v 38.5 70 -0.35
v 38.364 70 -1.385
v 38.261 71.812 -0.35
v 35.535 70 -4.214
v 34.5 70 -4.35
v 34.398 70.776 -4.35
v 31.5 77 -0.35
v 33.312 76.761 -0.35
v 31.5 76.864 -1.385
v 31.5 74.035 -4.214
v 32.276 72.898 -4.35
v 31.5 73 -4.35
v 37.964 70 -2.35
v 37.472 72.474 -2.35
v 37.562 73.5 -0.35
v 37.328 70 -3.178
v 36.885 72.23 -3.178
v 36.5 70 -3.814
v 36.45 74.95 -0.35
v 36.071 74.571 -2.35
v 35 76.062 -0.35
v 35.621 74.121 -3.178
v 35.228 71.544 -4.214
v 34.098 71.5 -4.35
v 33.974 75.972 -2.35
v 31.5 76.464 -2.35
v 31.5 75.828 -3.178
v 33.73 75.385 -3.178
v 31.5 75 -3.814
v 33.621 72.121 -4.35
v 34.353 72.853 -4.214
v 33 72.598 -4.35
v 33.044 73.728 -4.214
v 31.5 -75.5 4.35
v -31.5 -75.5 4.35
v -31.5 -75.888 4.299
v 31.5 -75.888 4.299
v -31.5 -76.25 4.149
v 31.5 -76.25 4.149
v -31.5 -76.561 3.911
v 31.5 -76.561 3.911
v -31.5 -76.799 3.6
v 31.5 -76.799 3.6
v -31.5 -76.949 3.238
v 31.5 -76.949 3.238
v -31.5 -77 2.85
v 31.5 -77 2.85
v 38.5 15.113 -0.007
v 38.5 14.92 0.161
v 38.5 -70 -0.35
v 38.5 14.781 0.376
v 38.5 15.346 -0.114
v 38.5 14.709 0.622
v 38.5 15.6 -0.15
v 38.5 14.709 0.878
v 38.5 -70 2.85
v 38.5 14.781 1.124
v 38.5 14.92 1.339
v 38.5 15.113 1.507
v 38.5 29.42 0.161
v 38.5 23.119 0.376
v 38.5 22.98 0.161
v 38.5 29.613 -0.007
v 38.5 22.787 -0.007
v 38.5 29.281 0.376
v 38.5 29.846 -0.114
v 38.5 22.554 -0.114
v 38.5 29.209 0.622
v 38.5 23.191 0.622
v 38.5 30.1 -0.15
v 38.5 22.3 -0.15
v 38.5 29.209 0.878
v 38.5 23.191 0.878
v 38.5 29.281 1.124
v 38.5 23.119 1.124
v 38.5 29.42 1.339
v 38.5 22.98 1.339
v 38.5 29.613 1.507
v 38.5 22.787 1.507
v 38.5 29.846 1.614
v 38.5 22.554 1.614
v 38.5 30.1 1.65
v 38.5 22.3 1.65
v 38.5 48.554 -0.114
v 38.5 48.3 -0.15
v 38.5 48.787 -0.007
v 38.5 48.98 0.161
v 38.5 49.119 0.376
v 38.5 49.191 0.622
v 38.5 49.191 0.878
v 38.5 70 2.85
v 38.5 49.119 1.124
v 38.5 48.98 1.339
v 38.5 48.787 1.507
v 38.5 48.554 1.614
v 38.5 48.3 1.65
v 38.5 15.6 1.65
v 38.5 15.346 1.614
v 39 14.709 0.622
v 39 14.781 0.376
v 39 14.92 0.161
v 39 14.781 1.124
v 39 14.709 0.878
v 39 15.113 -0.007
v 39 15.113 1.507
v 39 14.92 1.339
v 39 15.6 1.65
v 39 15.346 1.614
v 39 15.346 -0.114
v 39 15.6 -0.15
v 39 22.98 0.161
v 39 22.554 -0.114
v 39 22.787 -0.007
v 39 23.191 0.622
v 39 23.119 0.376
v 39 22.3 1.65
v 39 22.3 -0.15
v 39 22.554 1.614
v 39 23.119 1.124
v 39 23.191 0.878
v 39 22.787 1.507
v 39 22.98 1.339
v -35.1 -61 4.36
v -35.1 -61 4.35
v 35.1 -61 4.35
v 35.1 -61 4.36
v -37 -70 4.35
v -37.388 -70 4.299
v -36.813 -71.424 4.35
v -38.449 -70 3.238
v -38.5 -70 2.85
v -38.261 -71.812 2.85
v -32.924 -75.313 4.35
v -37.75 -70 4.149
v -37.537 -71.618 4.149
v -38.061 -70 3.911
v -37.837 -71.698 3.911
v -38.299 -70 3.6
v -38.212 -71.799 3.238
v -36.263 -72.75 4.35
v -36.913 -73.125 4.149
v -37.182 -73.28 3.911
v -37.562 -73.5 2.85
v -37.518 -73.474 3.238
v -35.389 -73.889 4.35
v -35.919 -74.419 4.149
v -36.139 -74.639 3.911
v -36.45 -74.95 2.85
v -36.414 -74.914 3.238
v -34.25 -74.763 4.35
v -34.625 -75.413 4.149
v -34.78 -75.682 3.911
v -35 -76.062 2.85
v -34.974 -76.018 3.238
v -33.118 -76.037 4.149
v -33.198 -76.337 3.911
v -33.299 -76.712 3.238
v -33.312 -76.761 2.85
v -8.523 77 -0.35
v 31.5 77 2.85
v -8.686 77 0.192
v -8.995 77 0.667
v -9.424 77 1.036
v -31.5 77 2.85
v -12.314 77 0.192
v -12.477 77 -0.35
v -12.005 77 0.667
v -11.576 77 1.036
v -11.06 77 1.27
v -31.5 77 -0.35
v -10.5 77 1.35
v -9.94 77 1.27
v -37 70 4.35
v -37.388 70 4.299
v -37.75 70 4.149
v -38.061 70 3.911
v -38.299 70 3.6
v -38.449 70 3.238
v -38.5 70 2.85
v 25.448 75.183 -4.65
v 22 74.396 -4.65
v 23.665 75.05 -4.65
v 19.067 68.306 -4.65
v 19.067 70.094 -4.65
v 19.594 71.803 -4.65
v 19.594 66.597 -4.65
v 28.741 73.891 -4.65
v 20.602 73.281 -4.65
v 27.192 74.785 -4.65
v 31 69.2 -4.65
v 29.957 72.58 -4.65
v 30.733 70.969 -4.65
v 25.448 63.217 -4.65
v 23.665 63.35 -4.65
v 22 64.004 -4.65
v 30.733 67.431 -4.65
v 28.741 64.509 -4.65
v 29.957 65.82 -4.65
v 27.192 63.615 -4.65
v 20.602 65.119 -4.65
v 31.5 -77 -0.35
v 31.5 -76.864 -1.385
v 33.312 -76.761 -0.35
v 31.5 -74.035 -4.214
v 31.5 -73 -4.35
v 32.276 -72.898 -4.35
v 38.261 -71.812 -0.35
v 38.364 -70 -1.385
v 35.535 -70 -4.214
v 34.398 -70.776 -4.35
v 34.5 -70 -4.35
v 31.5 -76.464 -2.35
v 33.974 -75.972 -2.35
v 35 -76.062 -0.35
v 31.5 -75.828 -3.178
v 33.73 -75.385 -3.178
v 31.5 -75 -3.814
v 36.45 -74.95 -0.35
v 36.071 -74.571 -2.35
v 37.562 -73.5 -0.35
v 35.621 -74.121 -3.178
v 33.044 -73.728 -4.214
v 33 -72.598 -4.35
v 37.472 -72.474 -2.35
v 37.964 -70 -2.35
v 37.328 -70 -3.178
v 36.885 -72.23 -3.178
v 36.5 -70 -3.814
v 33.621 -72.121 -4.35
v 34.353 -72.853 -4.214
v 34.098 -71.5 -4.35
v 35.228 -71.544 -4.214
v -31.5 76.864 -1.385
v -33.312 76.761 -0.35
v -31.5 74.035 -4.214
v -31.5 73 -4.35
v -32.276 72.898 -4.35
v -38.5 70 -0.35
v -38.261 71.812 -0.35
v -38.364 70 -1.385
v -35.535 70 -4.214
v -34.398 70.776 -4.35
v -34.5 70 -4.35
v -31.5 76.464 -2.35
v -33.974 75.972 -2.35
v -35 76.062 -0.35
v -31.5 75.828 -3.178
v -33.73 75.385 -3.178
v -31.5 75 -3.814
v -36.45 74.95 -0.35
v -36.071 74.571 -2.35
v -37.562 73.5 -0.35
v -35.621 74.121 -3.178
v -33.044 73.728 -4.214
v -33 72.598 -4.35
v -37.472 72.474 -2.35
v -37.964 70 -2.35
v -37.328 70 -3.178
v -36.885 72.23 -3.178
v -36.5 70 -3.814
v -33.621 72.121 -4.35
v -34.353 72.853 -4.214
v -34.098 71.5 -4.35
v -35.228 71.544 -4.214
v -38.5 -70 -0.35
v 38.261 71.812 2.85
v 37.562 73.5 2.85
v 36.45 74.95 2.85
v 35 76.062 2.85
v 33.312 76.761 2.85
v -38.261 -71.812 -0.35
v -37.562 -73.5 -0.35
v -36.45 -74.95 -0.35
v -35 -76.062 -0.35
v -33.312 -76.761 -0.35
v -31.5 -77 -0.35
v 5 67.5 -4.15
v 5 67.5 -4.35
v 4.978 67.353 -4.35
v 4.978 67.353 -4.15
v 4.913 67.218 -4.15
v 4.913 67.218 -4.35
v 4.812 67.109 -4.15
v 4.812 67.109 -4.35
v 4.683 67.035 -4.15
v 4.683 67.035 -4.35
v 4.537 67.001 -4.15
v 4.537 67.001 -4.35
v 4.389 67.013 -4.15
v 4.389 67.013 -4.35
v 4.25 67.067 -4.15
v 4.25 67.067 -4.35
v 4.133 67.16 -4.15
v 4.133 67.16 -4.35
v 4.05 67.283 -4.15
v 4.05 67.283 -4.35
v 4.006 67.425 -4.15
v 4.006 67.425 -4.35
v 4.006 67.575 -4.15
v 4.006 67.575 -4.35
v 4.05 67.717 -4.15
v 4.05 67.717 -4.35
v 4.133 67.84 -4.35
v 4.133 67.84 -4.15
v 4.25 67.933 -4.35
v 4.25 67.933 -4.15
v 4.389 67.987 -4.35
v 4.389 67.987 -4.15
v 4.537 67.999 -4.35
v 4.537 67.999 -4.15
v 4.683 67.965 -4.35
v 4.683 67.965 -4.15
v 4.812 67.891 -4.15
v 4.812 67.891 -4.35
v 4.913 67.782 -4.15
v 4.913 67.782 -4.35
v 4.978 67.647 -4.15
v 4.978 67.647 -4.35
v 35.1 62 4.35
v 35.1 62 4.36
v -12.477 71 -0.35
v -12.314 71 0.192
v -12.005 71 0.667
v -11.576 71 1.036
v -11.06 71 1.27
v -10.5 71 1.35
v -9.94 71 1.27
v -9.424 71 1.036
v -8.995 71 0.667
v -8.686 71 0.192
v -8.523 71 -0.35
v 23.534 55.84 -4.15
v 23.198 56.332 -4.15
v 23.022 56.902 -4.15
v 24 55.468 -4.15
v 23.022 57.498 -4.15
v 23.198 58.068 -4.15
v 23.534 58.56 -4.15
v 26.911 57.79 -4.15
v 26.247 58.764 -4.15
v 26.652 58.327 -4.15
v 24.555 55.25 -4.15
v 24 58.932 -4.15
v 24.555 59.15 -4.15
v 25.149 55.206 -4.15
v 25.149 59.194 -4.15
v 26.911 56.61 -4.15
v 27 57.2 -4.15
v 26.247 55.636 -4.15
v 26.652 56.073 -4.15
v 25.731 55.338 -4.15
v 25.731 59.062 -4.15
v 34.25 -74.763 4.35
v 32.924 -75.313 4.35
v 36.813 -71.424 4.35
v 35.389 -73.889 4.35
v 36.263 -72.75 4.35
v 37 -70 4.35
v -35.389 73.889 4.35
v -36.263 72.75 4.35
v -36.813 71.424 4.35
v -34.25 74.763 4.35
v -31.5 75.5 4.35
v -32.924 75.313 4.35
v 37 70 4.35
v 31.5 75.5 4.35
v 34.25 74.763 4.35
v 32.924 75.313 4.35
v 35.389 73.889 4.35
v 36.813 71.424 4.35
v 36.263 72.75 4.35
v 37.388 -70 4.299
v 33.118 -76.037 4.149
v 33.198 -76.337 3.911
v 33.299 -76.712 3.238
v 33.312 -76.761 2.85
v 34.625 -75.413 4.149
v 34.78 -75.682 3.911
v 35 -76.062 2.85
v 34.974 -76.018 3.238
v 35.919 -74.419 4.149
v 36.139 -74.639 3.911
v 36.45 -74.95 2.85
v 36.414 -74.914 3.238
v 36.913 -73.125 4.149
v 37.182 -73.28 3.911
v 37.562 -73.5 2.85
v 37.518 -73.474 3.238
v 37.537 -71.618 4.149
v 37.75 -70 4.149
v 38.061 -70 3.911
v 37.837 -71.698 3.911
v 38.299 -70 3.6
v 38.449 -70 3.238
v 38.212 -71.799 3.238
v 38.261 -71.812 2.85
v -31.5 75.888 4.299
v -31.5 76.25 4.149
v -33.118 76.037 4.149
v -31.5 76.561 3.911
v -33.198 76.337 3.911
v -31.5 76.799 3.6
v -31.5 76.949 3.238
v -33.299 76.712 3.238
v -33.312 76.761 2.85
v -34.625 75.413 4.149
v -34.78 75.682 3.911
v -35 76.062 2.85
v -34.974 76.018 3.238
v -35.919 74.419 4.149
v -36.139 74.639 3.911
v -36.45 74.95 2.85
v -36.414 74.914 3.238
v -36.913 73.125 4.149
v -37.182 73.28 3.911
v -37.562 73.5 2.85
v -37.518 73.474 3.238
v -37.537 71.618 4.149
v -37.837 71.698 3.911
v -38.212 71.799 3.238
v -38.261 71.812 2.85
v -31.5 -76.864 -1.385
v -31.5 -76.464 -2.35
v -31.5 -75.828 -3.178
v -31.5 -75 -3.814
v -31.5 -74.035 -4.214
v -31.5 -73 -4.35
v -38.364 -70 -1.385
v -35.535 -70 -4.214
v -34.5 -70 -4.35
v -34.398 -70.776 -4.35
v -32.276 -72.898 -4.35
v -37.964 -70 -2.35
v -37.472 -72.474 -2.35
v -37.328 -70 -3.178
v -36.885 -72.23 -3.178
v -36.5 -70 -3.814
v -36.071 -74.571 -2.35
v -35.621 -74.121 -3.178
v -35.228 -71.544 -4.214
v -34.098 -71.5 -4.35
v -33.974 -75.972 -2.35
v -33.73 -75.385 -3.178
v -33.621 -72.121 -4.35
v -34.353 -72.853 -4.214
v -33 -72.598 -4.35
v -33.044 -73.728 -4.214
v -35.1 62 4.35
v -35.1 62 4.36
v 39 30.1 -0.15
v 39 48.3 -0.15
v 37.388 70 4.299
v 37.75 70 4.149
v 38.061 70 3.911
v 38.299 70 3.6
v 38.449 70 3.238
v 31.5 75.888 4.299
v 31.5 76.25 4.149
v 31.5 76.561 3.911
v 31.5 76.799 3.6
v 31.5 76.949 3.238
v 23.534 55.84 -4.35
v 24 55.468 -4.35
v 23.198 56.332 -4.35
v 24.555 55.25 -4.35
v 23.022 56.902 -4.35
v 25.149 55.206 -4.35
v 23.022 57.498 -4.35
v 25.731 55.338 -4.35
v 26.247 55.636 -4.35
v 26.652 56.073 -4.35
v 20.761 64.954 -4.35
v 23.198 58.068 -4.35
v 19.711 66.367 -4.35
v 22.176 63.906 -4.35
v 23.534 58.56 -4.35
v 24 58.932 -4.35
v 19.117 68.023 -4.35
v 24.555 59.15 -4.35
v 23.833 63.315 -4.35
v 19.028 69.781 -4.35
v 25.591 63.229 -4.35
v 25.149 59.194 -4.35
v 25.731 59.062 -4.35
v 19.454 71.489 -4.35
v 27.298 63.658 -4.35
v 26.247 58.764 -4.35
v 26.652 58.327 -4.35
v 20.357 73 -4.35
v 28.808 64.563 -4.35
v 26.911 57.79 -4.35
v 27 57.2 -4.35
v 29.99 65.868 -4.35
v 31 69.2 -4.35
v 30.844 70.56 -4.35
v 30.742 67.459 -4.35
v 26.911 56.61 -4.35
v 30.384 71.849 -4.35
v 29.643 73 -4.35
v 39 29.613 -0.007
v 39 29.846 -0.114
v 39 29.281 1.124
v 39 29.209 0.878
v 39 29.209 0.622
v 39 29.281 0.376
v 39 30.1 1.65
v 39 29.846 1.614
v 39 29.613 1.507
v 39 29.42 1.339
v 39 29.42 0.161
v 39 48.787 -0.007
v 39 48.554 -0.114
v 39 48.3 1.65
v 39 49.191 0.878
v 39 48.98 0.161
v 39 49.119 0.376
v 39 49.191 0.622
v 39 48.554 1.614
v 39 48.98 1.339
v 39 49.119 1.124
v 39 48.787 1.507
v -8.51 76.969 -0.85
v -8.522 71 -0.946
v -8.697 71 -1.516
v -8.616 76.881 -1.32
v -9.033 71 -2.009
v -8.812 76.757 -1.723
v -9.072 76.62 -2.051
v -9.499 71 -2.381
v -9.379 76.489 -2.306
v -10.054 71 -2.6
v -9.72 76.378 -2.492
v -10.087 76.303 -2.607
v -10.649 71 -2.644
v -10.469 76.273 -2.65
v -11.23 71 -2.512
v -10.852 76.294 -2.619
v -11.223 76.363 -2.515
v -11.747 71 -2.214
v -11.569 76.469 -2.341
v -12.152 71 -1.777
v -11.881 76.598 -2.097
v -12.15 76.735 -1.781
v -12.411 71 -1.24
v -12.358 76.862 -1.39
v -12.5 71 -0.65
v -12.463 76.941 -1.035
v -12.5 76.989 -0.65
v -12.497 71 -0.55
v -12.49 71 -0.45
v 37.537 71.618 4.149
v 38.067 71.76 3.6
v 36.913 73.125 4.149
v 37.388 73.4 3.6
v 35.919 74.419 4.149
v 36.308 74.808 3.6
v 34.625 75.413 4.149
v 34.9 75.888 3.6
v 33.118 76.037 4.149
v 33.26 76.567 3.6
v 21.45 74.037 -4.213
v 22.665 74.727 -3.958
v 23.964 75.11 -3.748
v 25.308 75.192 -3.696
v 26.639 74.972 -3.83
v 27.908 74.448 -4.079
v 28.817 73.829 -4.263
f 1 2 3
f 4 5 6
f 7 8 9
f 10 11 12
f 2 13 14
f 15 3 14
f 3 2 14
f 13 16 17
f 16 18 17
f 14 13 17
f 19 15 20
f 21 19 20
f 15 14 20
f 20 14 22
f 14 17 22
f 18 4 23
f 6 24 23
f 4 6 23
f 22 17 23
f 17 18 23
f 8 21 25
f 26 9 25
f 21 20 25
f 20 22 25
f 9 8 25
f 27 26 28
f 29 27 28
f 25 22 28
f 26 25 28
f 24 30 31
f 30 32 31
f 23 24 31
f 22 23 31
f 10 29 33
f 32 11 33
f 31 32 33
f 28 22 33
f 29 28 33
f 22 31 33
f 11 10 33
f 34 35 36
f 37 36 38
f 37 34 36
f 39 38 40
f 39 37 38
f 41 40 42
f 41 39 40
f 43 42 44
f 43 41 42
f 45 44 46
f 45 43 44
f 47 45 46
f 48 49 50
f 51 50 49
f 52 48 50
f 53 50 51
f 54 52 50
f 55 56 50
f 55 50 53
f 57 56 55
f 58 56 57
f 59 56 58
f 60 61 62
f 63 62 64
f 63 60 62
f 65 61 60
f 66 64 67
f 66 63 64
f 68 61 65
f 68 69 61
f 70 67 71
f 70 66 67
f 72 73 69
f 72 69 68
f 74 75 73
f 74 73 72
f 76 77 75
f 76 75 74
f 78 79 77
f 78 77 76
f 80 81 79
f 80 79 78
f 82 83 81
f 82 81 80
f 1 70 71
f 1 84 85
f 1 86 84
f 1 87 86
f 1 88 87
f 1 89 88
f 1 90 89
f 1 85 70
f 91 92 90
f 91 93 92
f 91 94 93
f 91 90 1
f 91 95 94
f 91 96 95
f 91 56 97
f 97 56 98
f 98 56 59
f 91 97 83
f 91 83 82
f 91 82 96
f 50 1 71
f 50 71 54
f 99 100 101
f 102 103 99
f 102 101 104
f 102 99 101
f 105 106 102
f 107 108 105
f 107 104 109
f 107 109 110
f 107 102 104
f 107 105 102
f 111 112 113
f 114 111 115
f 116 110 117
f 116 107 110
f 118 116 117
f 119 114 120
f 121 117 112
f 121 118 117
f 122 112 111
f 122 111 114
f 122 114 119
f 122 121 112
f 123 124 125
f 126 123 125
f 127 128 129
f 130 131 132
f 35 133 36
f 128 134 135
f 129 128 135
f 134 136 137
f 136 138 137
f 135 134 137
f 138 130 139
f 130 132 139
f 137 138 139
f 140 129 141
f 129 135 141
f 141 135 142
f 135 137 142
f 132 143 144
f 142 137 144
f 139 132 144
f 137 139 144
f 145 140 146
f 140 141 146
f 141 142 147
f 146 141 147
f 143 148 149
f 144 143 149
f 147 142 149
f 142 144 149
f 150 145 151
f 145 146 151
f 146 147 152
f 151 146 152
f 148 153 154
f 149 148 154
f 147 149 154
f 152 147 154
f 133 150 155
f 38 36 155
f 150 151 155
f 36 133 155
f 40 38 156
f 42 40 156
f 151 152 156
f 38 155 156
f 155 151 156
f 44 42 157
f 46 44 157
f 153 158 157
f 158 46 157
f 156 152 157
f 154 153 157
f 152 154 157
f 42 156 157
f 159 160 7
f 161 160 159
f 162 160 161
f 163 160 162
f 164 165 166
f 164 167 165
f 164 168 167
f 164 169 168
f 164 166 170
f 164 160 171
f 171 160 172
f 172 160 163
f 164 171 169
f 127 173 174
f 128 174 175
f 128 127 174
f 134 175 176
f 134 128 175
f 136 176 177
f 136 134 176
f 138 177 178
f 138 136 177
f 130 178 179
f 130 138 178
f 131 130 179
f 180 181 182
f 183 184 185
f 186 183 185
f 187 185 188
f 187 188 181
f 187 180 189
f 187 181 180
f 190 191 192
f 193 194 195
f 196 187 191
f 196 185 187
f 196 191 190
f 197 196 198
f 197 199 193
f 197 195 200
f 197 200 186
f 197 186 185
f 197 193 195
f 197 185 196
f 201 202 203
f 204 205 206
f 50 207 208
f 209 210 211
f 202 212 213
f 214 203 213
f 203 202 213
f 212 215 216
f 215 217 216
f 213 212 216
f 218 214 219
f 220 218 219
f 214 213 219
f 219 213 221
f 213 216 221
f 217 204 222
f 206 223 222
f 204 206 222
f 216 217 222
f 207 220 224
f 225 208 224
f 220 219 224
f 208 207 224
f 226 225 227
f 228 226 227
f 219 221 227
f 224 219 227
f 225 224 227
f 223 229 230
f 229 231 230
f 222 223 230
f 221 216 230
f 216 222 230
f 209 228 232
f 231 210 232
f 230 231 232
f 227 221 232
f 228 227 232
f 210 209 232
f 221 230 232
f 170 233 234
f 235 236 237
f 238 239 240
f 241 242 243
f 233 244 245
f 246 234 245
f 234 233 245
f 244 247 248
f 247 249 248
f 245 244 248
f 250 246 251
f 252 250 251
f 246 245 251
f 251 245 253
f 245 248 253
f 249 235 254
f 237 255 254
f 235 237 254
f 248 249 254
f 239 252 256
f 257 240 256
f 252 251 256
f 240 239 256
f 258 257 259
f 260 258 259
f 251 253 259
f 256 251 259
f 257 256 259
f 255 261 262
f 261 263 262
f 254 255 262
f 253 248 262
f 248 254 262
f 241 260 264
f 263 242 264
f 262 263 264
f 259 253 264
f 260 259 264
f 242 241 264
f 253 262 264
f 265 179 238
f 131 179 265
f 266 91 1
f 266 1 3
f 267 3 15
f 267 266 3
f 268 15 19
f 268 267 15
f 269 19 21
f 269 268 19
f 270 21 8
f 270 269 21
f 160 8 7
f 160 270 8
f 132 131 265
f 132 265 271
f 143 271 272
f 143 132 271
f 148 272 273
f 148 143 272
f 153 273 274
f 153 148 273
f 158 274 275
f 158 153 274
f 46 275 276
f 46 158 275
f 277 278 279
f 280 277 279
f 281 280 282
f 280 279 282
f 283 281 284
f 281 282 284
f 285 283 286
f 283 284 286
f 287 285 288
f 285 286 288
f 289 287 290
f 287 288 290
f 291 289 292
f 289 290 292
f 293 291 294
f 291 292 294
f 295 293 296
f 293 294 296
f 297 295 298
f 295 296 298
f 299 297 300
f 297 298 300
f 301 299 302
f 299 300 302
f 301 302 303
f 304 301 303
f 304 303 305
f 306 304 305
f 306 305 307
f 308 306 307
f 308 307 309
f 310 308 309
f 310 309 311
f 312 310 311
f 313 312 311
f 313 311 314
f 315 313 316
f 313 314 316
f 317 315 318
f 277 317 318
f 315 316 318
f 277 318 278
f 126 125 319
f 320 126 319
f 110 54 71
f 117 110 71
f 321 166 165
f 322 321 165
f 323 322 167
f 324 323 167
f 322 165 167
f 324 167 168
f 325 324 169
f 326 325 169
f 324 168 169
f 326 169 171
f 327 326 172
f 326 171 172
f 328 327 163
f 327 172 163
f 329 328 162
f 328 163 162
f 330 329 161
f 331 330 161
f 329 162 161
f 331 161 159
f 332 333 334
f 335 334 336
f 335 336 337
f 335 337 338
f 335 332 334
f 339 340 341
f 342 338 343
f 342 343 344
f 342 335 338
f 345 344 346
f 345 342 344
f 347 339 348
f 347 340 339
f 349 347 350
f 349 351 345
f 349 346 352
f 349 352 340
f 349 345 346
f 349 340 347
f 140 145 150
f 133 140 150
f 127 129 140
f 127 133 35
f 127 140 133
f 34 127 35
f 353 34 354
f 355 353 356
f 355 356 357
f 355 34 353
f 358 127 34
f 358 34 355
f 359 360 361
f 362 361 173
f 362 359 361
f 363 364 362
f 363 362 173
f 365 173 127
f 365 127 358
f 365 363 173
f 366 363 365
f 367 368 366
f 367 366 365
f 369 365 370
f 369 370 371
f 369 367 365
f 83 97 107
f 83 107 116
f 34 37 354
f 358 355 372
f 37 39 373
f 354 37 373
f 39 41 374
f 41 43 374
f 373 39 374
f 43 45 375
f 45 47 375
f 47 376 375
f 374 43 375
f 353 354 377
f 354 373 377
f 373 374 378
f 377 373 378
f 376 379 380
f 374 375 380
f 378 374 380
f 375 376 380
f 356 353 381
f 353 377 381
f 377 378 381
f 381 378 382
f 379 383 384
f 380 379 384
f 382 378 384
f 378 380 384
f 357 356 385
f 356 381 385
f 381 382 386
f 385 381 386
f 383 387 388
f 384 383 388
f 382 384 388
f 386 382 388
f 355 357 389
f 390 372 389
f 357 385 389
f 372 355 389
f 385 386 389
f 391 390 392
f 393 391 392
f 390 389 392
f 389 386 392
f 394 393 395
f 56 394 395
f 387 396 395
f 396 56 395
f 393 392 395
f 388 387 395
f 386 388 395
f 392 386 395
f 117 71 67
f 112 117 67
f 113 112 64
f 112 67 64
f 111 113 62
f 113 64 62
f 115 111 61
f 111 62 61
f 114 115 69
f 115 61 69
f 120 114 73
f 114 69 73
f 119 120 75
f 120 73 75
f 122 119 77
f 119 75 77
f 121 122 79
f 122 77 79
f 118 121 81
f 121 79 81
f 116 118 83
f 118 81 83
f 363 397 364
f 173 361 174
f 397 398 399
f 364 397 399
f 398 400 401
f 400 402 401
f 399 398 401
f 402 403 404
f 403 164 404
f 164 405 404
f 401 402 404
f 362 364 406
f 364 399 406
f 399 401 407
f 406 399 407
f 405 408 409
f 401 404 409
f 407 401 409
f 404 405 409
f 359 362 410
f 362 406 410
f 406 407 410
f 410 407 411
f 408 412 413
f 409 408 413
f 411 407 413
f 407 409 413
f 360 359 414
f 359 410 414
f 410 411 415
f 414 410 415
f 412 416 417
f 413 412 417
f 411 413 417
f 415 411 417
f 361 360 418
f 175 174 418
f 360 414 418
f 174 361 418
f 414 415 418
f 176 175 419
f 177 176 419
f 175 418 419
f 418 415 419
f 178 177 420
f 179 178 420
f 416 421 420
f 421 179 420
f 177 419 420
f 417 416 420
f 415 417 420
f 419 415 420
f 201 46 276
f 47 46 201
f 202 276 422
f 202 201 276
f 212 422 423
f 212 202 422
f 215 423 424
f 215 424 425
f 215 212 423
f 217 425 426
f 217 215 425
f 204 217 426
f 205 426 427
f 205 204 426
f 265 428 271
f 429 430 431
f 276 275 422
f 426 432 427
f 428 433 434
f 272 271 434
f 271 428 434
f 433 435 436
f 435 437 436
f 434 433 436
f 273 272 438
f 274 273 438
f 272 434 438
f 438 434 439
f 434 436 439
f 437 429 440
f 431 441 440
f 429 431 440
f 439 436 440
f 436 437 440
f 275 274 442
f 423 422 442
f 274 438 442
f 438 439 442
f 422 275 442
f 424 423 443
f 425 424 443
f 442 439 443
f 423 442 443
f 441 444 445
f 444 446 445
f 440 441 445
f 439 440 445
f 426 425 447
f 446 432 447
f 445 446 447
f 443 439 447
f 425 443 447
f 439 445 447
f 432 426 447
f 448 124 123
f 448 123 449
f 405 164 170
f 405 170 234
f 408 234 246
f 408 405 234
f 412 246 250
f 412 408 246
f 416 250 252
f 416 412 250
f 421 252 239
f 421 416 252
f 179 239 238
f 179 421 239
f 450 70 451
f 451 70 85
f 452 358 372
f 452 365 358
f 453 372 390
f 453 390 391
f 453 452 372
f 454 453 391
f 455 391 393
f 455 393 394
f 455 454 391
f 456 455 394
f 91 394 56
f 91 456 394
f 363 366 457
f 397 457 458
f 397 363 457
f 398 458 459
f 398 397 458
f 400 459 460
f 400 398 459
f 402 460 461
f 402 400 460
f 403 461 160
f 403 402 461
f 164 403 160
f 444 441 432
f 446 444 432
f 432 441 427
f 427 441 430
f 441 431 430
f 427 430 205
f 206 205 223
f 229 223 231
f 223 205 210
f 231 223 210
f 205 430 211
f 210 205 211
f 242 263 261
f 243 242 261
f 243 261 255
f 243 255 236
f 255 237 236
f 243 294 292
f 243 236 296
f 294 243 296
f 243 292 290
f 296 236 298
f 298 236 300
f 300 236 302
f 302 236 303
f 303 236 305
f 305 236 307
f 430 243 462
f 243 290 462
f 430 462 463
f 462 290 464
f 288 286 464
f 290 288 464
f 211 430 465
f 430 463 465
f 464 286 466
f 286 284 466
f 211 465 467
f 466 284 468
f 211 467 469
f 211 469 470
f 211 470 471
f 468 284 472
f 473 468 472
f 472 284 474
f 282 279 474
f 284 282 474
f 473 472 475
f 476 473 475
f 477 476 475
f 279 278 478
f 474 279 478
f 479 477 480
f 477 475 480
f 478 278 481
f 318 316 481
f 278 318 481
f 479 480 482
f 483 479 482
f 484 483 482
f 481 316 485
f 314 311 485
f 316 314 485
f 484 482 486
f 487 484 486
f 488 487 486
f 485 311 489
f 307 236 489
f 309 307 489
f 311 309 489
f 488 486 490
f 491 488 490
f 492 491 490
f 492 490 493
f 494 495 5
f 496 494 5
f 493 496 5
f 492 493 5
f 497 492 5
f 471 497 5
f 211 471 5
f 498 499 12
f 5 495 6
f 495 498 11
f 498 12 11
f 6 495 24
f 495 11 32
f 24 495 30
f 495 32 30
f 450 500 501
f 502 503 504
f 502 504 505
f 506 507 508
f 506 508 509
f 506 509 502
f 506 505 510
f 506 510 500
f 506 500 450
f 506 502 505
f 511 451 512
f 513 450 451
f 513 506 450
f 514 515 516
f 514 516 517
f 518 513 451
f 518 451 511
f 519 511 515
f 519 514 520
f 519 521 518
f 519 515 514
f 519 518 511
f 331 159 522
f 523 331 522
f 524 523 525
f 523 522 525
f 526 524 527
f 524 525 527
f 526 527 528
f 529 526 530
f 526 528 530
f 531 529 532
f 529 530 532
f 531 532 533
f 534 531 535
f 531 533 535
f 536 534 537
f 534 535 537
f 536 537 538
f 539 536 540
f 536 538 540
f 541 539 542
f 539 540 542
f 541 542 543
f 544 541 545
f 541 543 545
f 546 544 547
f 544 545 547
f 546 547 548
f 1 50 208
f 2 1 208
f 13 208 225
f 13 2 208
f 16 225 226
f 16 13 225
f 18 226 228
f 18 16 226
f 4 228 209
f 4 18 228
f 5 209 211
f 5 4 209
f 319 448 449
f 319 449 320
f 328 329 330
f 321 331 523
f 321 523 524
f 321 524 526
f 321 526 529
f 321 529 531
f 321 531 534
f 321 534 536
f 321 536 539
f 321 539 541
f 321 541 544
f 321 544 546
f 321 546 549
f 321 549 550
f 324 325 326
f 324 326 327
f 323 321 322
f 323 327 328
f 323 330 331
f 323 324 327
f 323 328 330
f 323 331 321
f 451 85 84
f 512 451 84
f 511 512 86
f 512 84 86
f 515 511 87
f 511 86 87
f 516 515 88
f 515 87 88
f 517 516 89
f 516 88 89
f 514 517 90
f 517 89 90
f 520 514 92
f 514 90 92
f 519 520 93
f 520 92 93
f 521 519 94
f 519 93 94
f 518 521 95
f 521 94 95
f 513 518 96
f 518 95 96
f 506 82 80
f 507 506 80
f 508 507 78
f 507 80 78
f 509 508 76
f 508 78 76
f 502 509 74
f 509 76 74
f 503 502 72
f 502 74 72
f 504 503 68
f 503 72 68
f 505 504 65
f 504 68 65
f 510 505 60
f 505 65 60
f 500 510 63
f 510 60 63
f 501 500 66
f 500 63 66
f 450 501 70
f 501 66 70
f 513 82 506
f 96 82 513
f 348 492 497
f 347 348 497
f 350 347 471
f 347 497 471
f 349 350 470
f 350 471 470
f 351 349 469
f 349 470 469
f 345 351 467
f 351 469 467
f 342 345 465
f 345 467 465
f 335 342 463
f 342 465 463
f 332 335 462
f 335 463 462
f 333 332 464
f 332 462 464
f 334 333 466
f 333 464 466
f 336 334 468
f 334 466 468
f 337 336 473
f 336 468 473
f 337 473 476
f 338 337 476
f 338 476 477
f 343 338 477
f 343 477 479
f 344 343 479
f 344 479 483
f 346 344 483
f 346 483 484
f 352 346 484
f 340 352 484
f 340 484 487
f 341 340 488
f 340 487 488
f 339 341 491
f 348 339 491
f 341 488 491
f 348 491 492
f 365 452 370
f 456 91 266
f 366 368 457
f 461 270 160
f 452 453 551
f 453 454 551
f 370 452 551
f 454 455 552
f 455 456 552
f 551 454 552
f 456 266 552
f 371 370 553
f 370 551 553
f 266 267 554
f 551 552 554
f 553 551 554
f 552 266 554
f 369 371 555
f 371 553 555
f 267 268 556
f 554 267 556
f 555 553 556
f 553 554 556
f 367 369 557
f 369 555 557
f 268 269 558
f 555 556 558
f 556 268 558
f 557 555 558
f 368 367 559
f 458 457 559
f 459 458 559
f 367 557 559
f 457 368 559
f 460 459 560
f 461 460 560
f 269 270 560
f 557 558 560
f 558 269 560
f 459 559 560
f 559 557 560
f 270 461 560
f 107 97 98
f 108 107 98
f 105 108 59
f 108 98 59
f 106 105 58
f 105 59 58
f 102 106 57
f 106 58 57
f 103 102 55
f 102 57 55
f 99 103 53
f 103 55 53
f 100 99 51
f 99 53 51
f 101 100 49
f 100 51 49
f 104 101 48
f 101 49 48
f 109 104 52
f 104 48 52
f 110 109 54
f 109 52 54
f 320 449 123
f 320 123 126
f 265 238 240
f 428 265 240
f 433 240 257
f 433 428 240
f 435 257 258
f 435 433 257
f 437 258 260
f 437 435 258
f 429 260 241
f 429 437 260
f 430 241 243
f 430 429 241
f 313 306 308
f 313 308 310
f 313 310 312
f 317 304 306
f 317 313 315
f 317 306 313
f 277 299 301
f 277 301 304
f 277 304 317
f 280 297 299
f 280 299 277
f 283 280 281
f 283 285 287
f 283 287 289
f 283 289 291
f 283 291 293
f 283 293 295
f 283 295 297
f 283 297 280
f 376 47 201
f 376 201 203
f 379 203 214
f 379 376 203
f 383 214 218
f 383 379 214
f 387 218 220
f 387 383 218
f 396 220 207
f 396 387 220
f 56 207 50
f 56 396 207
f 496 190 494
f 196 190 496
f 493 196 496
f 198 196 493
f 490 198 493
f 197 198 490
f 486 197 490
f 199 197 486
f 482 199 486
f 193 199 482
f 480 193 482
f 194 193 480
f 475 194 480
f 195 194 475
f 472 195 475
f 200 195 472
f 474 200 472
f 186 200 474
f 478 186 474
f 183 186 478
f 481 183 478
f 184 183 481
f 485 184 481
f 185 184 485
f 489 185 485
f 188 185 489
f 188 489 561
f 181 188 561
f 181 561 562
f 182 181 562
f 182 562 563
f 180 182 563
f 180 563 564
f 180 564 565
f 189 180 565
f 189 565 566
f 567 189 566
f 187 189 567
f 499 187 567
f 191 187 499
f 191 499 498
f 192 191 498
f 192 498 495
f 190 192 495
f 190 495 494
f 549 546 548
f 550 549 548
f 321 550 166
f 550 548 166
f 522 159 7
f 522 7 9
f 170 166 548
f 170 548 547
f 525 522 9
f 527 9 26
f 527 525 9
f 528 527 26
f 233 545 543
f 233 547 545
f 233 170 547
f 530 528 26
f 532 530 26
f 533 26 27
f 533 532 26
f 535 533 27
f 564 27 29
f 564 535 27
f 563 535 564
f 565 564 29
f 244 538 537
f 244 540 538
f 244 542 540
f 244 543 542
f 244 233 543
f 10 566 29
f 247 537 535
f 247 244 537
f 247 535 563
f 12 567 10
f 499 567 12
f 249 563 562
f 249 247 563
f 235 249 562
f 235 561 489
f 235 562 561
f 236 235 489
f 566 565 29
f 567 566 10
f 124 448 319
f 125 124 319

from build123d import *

# Parameters (mm, degrees)
F1_DEPTH  = 4.35
F2_R      = 4
F3_R      = 1.5
F7_R      = 6
F8_DEPTH  = 4.65
F9_W      = 70.2
F9_H      = 123
F10_DEPTH = 0.01
F11_R     = 2
F11_R_2   = 0.5
F12_DEPTH = 0.2
F14_DEPTH = 6
F15_W     = 18.2
F15_H     = 1.8
F15_W_2   = 6.7
F16_DEPTH = 0.5


with BuildPart() as f1:
    # F0 (on Top) → F1 (new body, symmetric)
    with BuildSketch(Plane.XY):
        with BuildLine():
            Line((31.5, 77), (-31.5, 77))
            ThreePointArc((-31.5, 77), (-36.4497474683, 74.9497474683), (-38.5, 70))
            Line((-38.5, 70), (-38.5, -70))
            ThreePointArc((-38.5, -70), (-36.4497474683, -74.9497474683), (-31.5, -77))
            Line((-31.5, -77), (31.5, -77))
            ThreePointArc((31.5, -77), (36.4497474683, -74.9497474683), (38.5, -70))
            Line((38.5, -70), (38.5, 70))
            ThreePointArc((38.5, 70), (36.4497474683, 74.9497474683), (31.5, 77))
        make_face()
    extrude(amount=F1_DEPTH, both=True)

    # F2
    f2_edges = [f1.edges().sort_by_distance(p)[0] for p in [
        (38.5, 0, -4.35),
    ]]
    fillet(f2_edges, radius=F2_R)

    # F3
    f3_edges = [f1.edges().sort_by_distance(p)[0] for p in [
        (36.449747, 74.949747, 4.35),
        (0, 77, 4.35),
        (-36.449747, 74.949747, 4.35),
        (-38.5, 0, 4.35),
        (-36.449747, -74.949747, 4.35),
        (0, -77, 4.35),
        (36.449747, -74.949747, 4.35),
        (38.5, 0, 4.35),
    ]]
    fillet(f3_edges, radius=F3_R)

    # F7 (on offset) → F8 (join, through all)
    with BuildSketch(Plane(origin=(0, 0, -4.65), x_dir=(1, 0, 0), z_dir=(0, 0, -1))):
        with Locations((25, -69.2)):
            Circle(F7_R)
    extrude(amount=-F8_DEPTH)

    # F11 (on face) → F12 (cut)
    with BuildSketch(Plane(origin=(0, 0, -4.35), x_dir=(1, 0, 0), z_dir=(0, 0, -1))):
        with Locations((25, -57.2)):
            Circle(F11_R)
        with Locations((4.5, -67.5)):
            Circle(F11_R_2)
    extrude(amount=-F12_DEPTH, mode=Mode.SUBTRACT)

    # F13 (on face) → F14 (cut)
    with BuildSketch(Plane(origin=(0, 77, 0), x_dir=(-1, 0, 0), z_dir=(0, 1, 0))):
        with BuildLine():
            ThreePointArc((8.5226280067, -0.35), (10.3495739163, -2.6443349752), (12.5, -0.65))
            ThreePointArc((12.5, -0.65), (12.4943349752, -0.4995739163), (12.4773719933, -0.35))
            Line((12.4773719933, -0.35), (8.5226280067, -0.35))
        make_face()
        with BuildLine():
            Line((8.5226280067, -0.35), (12.4773719933, -0.35))
            ThreePointArc((12.4773719933, -0.35), (10.5, 1.35), (8.5226280067, -0.35))
        make_face()
    extrude(amount=-F14_DEPTH, mode=Mode.SUBTRACT)

    # F15 (on face) → F16 (join)
    with BuildSketch(Plane.YZ.offset(38.5)):
        with BuildLine():
            ThreePointArc((48.3, -0.15), (49.2, 0.75), (48.3, 1.65))
            Line((48.3, 1.65), (48.3, -0.15))
        make_face()
        with Locations((39.2, 0.75)):
            Rectangle(F15_W, F15_H)
        with BuildLine():
            Line((30.1, -0.15), (30.1, 1.65))
            ThreePointArc((30.1, 1.65), (29.2, 0.75), (30.1, -0.15))
        make_face()
        with BuildLine():
            ThreePointArc((22.3, -0.15), (23.2, 0.75), (22.3, 1.65))
            Line((22.3, 1.65), (22.3, -0.15))
        make_face()
        with Locations((18.95, 0.75)):
            Rectangle(F15_W_2, F15_H)
        with BuildLine():
            Line((15.6, -0.15), (15.6, 1.65))
            ThreePointArc((15.6, 1.65), (14.7, 0.75), (15.6, -0.15))
        make_face()
    extrude(amount=F16_DEPTH)


with BuildPart() as f10:
    # F9 (on face) → F10 (new body)
    with BuildSketch(Plane.XY.offset(4.35)):
        with Locations((0, 0.5)):
            Rectangle(F9_W, F9_H)
    extrude(amount=F10_DEPTH)


solid = Compound([f1.part, f10.part])
